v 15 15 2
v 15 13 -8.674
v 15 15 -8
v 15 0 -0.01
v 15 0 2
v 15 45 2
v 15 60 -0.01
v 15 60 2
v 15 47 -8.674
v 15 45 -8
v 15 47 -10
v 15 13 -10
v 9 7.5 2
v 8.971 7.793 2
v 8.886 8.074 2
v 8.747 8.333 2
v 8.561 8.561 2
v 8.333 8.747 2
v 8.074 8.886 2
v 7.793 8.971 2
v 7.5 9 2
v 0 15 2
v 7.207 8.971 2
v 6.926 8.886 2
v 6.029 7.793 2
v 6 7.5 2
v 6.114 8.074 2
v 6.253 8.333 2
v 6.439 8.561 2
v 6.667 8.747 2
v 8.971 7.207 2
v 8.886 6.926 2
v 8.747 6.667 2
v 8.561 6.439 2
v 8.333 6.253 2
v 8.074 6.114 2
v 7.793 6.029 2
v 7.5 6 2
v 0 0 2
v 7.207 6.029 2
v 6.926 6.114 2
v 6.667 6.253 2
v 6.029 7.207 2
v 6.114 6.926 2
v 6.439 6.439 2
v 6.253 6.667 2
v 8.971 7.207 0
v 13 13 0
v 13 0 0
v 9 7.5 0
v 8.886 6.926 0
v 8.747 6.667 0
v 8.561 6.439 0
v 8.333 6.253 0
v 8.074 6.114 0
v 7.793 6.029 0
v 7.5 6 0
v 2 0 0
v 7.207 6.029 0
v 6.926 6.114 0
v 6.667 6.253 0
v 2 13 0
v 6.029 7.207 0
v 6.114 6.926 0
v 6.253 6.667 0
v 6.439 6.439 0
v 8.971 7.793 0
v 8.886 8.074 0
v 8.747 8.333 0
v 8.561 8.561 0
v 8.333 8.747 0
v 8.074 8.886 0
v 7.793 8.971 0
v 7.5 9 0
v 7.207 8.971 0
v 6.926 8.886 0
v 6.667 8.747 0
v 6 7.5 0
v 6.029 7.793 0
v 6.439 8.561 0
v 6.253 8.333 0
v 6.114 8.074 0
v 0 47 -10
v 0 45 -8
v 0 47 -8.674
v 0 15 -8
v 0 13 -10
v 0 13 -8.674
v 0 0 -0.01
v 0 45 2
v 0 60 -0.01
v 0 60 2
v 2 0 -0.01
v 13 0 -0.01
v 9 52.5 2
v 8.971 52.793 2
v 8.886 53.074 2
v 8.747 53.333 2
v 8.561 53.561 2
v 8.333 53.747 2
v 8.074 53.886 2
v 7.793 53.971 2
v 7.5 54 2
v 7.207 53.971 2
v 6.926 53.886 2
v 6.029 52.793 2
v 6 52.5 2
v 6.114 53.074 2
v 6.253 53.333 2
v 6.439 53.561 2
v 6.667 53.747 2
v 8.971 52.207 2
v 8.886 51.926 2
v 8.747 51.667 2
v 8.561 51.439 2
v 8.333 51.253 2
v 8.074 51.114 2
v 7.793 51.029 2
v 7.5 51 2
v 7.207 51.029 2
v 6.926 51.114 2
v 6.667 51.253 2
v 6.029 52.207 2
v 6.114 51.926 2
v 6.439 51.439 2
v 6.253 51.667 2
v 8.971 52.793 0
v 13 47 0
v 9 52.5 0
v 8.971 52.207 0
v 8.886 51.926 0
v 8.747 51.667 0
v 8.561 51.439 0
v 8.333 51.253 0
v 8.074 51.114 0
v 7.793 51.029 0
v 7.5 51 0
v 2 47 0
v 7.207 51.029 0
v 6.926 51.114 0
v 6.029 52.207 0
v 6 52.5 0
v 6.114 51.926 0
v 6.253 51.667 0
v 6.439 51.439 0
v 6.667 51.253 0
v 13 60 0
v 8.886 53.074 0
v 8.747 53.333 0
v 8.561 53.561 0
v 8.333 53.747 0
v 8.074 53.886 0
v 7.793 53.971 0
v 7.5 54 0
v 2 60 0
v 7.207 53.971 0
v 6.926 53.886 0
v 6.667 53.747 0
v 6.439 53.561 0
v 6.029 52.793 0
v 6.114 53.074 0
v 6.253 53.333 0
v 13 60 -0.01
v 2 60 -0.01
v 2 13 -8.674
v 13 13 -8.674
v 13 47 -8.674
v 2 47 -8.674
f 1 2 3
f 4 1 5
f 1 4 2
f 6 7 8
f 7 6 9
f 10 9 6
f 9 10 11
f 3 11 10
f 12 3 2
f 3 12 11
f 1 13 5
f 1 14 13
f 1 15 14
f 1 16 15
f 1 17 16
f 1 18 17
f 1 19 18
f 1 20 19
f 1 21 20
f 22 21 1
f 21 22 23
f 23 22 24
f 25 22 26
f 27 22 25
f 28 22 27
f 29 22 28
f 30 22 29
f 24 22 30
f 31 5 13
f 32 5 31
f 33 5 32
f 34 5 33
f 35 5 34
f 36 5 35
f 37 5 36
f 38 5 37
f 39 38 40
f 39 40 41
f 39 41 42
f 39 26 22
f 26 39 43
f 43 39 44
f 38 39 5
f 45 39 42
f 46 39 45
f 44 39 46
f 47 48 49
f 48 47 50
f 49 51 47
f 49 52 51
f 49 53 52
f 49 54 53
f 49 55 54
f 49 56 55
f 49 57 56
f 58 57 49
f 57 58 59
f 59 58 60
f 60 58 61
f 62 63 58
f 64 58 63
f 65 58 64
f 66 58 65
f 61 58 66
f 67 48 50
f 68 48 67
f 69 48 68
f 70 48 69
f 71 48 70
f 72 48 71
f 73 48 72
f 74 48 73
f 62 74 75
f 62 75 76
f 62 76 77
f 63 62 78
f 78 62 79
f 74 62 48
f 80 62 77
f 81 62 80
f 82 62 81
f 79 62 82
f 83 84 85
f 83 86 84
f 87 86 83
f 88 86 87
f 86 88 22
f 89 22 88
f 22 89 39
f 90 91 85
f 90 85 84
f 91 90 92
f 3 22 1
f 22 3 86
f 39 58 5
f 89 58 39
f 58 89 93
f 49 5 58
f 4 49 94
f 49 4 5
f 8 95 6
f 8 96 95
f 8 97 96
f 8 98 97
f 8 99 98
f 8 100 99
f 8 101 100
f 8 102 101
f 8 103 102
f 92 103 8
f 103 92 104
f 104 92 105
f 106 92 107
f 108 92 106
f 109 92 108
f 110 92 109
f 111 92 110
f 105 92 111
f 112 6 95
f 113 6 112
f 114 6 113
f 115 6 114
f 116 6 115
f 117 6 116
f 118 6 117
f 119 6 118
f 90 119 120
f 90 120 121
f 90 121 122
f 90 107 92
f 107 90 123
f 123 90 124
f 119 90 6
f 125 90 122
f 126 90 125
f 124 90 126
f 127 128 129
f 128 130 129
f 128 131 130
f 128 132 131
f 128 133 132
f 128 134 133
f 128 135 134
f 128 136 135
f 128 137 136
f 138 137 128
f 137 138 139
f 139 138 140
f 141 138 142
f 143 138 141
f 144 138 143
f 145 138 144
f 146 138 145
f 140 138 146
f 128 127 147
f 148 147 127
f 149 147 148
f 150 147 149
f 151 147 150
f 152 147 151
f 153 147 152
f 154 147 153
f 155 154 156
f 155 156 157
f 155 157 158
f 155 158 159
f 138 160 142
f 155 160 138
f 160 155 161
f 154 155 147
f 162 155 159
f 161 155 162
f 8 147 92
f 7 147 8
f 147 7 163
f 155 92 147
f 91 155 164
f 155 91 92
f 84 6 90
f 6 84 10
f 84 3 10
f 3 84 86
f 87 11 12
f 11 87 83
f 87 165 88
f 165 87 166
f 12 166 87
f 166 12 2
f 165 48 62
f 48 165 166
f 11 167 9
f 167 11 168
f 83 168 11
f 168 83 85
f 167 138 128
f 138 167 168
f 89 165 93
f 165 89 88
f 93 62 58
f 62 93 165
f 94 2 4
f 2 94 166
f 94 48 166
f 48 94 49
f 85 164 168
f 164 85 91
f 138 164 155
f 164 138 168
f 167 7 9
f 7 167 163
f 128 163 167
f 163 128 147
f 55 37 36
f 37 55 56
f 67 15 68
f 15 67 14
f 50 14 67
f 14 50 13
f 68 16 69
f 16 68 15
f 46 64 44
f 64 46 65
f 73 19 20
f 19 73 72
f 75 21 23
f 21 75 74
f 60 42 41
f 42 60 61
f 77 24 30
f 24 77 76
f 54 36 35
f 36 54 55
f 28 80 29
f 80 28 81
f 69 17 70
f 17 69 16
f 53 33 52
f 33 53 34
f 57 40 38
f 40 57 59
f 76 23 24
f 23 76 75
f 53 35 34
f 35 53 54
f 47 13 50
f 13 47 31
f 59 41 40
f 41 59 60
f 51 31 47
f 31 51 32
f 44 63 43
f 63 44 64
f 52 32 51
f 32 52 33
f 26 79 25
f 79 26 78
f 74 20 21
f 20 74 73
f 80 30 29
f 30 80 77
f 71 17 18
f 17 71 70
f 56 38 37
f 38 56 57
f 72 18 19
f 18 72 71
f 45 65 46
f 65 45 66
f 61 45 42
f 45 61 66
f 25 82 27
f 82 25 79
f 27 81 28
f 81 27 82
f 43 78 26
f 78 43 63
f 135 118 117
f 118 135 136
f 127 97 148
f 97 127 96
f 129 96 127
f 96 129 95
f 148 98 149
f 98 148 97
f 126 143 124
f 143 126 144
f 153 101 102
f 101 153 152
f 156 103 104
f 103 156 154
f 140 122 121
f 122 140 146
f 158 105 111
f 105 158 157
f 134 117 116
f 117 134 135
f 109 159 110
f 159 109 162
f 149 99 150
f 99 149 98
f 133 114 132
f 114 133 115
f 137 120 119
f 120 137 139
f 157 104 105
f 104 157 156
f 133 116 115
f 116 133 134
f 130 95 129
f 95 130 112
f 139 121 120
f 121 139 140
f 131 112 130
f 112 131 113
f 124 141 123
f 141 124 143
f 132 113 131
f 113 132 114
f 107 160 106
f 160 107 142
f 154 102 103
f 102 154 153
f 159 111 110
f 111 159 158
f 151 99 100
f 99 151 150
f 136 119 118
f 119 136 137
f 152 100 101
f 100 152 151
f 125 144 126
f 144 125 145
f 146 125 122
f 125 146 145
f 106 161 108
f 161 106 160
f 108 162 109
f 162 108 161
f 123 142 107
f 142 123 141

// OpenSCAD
// Wire holder: two overhangs with triangular gussets connected by a bridge
// Walls between each pair of gussets linking overhang tabs to bridge
// Based on 8bitdo_v013 overhang/gusset dimensions

// Overhang dimensions (from 8bitdo reference)
overhang_width = 15;
overhang_length = 15;
overhang_thickness = 2;

// Gusset dimensions
gusset_thickness = 2;
gusset_height = 10;

// Screw hole
screw_hole_d = 3;

// Bridge dimensions
bridge_span = 30;       // distance between the two overhangs
bridge_thickness = 2;
bridge_width = 15;      // same as overhang_width

// Wall thickness (between gusset pairs)
wall_thickness = 2;

// Gusset module: right-triangle brace
module gusset(length, height, thickness) {
    hull() {
        cube([thickness, 0.01, height]);
        translate([0, length - 0.01, height - 0.01])
            cube([thickness, 0.01, 0.01]);
    }
}

difference() {
    union() {
        // Left overhang (mounts to surface)
        translate([0, 0, 0])
            cube([overhang_width, overhang_length, overhang_thickness]);

        // Right overhang (mounts to surface)
        translate([0, overhang_length + bridge_span, 0])
            cube([overhang_width, overhang_length, overhang_thickness]);

        // Bridge connecting the two overhangs below
        translate([0, overhang_length, -gusset_height])
            cube([bridge_width, bridge_span, bridge_thickness]);

        // Wall between left gussets (vertical drop from tab to bridge)
        translate([0, overhang_length - wall_thickness, -gusset_height])
            cube([overhang_width, wall_thickness, gusset_height]);

        // Wall between right gussets (vertical drop from tab to bridge)
        translate([0, overhang_length + bridge_span, -gusset_height])
            cube([overhang_width, wall_thickness, gusset_height]);

        // Gussets - left overhang
        translate([0, overhang_length, -gusset_height])
            mirror([0, 1, 0])
                gusset(overhang_length, gusset_height, gusset_thickness);
        translate([overhang_width - gusset_thickness, overhang_length, -gusset_height])
            mirror([0, 1, 0])
                gusset(overhang_length, gusset_height, gusset_thickness);

        // Gussets - right overhang
        translate([0, overhang_length + bridge_span, -gusset_height])
            gusset(overhang_length, gusset_height, gusset_thickness);
        translate([overhang_width - gusset_thickness, overhang_length + bridge_span, -gusset_height])
            gusset(overhang_length, gusset_height, gusset_thickness);
    }

    // Screw holes in overhang tabs
    translate([overhang_width / 2, overhang_length / 2, -1])
        cylinder(h = overhang_thickness + 2, d = screw_hole_d, $fn = 32);
    translate([overhang_width / 2, overhang_length + bridge_span + overhang_length / 2, -1])
        cylinder(h = overhang_thickness + 2, d = screw_hole_d, $fn = 32);
}
